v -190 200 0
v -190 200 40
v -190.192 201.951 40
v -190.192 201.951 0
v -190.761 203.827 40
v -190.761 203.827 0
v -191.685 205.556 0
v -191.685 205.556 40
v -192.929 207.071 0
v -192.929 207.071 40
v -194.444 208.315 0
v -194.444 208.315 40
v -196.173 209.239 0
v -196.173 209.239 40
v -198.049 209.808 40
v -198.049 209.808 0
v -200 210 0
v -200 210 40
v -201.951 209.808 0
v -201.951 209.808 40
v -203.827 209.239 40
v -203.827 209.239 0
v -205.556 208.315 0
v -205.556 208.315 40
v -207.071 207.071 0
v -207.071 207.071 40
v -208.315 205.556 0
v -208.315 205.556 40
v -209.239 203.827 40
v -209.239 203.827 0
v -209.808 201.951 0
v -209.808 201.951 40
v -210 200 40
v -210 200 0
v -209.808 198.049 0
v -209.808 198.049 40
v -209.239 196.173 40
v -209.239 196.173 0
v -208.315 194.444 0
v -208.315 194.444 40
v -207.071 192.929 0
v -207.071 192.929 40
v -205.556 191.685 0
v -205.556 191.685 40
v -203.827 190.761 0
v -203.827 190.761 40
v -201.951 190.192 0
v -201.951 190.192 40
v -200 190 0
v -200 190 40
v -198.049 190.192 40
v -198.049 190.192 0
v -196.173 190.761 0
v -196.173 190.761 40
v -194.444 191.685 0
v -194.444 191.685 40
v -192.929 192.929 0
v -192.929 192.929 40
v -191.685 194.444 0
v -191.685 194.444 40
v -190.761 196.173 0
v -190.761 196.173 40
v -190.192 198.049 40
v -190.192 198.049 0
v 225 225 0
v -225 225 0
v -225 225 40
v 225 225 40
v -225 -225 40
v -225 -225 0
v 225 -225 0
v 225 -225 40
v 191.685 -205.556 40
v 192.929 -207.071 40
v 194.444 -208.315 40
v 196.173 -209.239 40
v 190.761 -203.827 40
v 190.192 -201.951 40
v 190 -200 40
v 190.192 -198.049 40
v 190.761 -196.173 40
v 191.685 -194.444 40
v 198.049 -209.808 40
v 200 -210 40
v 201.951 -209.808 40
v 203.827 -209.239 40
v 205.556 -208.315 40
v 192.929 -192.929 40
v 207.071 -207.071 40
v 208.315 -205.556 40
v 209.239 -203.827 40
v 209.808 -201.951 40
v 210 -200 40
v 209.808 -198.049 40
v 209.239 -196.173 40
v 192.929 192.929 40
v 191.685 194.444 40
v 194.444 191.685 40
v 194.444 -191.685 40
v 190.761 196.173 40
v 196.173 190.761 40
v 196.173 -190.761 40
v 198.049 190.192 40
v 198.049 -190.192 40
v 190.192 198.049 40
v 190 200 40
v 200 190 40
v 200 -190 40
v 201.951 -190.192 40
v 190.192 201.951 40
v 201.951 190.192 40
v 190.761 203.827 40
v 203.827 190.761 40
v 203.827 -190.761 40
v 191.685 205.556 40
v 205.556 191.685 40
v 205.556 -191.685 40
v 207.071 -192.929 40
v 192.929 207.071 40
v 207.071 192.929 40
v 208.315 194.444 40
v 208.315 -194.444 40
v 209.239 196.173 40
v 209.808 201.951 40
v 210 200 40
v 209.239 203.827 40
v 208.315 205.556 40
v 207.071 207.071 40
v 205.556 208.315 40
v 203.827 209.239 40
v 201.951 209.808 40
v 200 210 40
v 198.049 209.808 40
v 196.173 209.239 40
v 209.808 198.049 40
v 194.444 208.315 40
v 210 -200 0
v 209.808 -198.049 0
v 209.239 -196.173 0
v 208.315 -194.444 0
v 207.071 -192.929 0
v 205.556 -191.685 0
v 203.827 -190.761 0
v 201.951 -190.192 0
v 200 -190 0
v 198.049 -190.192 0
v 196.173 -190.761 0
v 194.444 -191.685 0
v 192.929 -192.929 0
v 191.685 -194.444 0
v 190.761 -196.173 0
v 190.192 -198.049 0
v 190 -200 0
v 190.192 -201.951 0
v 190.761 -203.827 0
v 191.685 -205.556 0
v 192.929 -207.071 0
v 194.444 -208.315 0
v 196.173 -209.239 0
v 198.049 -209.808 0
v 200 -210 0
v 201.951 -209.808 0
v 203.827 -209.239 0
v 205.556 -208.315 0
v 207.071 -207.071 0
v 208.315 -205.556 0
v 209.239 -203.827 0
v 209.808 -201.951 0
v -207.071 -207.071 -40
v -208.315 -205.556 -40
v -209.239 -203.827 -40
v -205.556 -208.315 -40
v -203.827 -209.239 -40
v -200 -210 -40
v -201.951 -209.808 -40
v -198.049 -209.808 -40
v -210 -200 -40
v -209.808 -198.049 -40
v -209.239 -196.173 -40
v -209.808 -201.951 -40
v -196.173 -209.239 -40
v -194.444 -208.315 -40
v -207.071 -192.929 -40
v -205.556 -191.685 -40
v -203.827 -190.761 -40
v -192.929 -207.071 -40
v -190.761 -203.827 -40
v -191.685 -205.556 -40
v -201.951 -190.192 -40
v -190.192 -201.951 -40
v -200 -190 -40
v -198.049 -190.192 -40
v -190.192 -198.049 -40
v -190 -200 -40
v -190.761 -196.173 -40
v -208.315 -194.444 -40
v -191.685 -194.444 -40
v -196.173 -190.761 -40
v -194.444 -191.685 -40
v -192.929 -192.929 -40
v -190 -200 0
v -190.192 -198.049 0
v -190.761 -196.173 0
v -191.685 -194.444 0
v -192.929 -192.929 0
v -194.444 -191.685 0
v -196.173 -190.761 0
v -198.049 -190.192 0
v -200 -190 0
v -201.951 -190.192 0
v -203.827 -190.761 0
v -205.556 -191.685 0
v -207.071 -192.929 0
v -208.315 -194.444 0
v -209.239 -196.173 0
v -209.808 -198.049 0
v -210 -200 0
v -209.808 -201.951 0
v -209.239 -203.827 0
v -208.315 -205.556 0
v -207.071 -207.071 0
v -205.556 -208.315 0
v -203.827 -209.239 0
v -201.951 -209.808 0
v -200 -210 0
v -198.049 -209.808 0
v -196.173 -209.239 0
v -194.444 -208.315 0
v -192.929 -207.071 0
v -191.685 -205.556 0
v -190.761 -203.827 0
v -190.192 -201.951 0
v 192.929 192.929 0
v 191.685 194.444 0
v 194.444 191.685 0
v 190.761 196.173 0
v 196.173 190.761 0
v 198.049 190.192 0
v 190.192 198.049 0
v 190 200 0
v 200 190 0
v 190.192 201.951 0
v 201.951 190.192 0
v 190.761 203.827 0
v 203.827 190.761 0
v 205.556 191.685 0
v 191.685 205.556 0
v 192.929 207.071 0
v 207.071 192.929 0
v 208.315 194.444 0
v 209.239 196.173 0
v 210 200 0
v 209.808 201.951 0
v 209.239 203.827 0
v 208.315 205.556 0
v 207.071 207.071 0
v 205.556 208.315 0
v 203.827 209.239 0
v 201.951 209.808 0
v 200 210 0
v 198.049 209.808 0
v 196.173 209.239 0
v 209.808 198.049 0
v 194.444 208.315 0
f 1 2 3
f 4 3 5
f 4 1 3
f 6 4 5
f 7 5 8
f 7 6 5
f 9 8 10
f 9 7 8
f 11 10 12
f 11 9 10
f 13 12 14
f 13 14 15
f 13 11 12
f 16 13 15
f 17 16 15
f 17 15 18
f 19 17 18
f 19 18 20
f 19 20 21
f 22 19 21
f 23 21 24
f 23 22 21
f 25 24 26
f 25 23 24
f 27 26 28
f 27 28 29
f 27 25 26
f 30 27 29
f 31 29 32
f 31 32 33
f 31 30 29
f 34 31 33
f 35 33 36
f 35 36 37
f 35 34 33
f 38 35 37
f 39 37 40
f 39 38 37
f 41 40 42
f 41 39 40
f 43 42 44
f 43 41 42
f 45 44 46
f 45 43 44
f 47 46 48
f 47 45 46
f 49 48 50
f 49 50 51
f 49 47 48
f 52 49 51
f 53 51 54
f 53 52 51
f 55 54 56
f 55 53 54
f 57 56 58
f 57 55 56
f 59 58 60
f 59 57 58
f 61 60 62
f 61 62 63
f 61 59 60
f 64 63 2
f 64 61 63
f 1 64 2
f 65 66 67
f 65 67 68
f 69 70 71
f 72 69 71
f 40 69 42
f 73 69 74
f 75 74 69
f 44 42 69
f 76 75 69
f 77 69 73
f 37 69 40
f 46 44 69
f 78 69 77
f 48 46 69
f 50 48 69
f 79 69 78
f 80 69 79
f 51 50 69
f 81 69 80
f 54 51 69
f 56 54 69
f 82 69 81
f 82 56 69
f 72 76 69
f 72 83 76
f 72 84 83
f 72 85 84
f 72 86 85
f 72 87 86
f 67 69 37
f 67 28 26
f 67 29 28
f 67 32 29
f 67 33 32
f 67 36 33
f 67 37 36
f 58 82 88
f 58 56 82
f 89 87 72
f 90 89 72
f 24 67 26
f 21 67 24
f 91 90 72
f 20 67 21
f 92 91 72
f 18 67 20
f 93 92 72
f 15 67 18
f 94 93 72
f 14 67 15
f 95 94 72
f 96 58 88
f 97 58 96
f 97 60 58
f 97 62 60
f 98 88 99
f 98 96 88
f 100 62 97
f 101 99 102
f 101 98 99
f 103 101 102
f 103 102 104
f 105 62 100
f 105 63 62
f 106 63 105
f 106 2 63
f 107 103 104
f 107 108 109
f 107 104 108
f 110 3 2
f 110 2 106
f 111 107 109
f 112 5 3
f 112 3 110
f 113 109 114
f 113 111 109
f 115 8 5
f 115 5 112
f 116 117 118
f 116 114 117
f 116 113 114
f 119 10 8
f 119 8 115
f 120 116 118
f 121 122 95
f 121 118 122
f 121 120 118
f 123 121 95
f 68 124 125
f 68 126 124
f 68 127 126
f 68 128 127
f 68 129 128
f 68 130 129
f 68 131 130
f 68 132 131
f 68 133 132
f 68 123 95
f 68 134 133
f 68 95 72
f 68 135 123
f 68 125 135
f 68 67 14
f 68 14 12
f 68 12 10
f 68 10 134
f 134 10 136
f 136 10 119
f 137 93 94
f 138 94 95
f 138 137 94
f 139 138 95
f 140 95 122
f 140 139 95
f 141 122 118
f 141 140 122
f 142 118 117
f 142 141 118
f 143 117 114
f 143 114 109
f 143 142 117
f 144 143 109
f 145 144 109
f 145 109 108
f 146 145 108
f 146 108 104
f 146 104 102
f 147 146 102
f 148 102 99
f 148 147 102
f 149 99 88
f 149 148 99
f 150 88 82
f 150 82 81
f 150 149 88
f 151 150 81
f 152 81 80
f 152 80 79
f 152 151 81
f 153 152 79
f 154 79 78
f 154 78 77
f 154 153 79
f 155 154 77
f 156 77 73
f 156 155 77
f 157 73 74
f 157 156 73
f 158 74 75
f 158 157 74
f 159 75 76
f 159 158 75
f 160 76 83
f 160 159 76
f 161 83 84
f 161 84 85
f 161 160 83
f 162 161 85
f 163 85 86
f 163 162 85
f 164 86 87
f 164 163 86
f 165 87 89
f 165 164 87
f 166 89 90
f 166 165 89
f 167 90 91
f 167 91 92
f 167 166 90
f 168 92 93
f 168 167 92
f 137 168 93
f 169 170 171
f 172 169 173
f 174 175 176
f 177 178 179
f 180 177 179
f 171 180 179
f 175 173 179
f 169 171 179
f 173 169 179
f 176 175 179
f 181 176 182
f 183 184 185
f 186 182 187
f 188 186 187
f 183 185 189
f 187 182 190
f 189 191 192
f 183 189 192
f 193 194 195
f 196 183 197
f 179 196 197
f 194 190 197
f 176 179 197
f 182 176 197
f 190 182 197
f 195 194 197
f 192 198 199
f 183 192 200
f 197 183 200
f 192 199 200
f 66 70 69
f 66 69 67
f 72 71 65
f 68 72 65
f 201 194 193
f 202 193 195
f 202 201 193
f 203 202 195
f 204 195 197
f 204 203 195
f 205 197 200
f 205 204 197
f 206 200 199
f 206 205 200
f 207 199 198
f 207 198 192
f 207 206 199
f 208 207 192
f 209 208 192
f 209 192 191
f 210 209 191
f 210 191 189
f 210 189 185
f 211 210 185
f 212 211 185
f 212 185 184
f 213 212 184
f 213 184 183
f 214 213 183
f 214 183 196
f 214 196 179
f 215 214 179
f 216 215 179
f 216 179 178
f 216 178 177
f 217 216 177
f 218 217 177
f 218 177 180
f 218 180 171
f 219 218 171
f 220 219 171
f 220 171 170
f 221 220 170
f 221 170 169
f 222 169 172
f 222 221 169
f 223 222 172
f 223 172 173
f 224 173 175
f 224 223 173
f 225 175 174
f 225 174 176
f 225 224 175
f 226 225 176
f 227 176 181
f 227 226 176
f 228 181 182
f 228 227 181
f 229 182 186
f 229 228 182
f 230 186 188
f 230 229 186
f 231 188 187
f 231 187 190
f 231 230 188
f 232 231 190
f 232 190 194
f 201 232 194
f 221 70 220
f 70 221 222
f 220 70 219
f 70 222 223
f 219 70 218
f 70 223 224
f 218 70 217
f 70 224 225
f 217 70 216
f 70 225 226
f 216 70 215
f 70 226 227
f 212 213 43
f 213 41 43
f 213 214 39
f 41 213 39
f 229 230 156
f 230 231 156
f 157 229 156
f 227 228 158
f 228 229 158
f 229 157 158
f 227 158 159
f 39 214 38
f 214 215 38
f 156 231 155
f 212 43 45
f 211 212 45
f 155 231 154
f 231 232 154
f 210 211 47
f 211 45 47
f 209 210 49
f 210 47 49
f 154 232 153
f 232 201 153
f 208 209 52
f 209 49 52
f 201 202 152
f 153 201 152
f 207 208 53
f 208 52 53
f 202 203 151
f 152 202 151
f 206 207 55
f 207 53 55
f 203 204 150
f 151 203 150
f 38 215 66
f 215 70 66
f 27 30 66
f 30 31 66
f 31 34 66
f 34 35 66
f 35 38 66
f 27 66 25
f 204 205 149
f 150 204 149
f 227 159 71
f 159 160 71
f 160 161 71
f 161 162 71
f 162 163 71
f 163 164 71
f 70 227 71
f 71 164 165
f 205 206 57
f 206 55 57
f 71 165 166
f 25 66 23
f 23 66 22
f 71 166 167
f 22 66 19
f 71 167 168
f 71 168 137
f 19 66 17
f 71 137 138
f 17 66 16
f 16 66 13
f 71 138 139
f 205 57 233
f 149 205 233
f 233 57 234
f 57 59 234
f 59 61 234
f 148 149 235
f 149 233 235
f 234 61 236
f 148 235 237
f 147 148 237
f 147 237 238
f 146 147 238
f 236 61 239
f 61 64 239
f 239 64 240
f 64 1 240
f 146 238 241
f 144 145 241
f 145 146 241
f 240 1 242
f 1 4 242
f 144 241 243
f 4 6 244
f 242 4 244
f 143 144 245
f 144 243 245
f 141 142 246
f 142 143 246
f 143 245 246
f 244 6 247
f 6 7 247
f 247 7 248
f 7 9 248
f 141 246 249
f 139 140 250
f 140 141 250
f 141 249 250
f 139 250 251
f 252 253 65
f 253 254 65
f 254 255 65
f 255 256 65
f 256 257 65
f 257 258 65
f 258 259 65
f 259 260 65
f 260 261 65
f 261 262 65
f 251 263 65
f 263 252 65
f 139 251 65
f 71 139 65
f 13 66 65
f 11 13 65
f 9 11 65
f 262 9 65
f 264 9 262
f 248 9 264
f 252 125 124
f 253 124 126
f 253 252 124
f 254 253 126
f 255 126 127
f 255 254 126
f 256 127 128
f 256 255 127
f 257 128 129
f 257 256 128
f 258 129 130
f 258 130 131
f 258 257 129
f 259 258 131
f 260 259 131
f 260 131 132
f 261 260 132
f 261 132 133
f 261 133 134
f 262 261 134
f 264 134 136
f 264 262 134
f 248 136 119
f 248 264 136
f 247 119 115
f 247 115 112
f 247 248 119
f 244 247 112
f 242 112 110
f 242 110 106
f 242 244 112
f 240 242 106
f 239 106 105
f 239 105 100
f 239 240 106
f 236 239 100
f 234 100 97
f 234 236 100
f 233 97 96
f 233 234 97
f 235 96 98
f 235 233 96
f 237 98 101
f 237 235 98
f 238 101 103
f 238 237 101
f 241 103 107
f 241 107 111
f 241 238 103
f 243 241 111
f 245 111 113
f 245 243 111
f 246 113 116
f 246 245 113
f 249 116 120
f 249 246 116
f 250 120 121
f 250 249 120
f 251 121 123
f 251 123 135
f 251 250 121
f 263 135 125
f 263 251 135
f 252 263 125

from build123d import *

# Parameters (mm, degrees)
F0_W     = 450
F0_H     = 450
F0_R     = 10
F1_DEPTH = 40
F2_R     = 10
F3_DEPTH = 80


# Not quite as in the source:
# - the program builds the solid bodies; features that only make, move or delete a surface that nothing else refers to are left out


with BuildPart() as f1:
    # F0 (on Top) → F1 (new body)
    with BuildSketch(Plane.XY):
        Rectangle(F0_W, F0_H)
        with Locations((-200, -200)):
            Circle(F0_R, mode=Mode.SUBTRACT)
        with Locations((200, -200)):
            Circle(F0_R, mode=Mode.SUBTRACT)
        with Locations((-200, 200)):
            Circle(F0_R, mode=Mode.SUBTRACT)
        with Locations((200, 200)):
            Circle(F0_R, mode=Mode.SUBTRACT)
    extrude(amount=F1_DEPTH)

    # F2 (on face) → F3 (join)
    with BuildSketch(Plane.XY.offset(40)):
        with Locations((-200, -200)):
            Circle(F2_R)
    extrude(amount=-F3_DEPTH)


solid = f1.part
